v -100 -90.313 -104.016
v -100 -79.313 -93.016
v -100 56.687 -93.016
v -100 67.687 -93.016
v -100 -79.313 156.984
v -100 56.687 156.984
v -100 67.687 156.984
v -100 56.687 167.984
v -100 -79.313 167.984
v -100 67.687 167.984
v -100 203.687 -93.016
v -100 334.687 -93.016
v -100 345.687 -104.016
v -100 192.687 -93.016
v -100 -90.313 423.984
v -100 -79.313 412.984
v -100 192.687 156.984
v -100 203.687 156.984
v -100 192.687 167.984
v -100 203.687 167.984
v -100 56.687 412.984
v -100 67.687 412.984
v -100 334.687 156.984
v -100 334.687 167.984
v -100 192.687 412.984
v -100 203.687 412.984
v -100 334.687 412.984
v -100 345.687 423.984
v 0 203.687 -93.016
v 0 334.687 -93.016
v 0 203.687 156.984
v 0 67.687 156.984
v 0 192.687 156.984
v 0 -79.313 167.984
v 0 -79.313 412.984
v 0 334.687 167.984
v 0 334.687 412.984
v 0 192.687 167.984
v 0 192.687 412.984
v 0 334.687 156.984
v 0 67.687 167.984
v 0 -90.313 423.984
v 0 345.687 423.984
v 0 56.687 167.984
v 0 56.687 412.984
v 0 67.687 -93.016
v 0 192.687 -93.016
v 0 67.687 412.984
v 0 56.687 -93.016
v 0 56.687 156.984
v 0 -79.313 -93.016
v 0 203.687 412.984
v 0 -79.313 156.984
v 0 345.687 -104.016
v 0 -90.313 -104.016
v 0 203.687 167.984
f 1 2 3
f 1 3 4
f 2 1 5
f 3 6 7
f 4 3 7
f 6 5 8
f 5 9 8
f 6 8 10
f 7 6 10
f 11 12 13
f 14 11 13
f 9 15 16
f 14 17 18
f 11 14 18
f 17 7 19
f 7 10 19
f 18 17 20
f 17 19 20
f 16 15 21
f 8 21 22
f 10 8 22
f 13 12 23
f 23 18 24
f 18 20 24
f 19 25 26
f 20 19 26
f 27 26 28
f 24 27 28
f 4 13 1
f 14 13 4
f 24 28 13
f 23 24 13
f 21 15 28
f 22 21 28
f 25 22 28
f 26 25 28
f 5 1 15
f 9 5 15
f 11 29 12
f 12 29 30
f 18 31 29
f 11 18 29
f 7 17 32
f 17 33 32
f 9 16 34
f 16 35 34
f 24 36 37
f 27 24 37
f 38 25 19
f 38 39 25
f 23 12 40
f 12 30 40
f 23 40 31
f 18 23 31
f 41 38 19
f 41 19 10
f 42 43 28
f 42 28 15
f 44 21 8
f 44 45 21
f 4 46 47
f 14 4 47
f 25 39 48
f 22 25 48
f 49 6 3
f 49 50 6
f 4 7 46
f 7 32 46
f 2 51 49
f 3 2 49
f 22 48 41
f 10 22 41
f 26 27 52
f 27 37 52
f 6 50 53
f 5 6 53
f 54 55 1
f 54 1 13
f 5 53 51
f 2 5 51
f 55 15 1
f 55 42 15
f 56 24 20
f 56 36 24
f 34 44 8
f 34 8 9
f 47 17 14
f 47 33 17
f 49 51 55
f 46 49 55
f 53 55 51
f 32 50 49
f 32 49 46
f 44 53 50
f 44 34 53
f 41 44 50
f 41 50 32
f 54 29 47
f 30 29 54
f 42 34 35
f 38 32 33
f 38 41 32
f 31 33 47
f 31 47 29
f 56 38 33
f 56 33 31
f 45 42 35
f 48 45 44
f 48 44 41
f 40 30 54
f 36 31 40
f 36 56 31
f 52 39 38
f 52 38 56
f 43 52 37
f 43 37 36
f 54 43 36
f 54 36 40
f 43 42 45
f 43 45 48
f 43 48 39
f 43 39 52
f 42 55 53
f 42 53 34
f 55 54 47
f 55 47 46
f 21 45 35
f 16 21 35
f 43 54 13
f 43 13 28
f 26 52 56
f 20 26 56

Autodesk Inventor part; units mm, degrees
ref_plane "YZ Plane" through (0, 0, 0) normal (1, 0, 0) x (0, 1, 0)
ref_plane "XZ Plane" through (0, 0, 0) normal (0, 1, 0) x (-1, 0, 0)
ref_plane "XY Plane" through (0, 0, 0) normal (0, 0, 1) x (1, 0, 0)
sketch "Sketch1" plane through (0, 0, 0) normal (1, 0, 0) x (0, 1, 0)
  line L0 (345.6873, 423.9836) -> (-90.3127, 423.9836)
  line L1 (-90.3127, 423.9836) -> (-90.3127, -104.0164)
  line L2 (-90.3127, -104.0164) -> (345.6873, -104.0164)
  line L3 (345.6873, -104.0164) -> (345.6873, 423.9836)
  line L4 (334.6873, -93.0164) -> (334.6873, 156.9836)
  line L5 (334.6873, 167.9836) -> (334.6873, 412.9836)
  line L6 (203.6873, 412.9836) -> (203.6873, 167.9836)
  line L7 (203.6873, 156.9836) -> (203.6873, -93.0164)
  line L8 (192.6873, 412.9836) -> (192.6873, 167.9836)
  line L9 (192.6873, 156.9836) -> (192.6873, -93.0164)
  line L10 (334.6873, 156.9836) -> (203.6873, 156.9836)
  line L11 (334.6873, 167.9836) -> (203.6873, 167.9836)
  line L12 (334.6873, 412.9836) -> (203.6873, 412.9836)
  line L13 (192.6873, 412.9836) -> (67.6873, 412.9836)
  line L14 (56.6873, 412.9836) -> (-79.3127, 412.9836)
  line L15 (192.6873, 156.9836) -> (67.6873, 156.9836)
  line L16 (56.6873, 156.9836) -> (-79.3127, 156.9836)
  line L17 (192.6873, 167.9836) -> (67.6873, 167.9836)
  line L18 (56.6873, 167.9836) -> (-79.3127, 167.9836)
  line L19 (56.6873, 412.9836) -> (56.6873, 167.9836)
  line L20 (56.6873, 156.9836) -> (56.6873, -93.0164)
  line L21 (67.6873, 412.9836) -> (67.6873, 167.9836)
  line L22 (67.6873, 156.9836) -> (67.6873, -93.0164)
  line L23 (-79.3127, -93.0164) -> (56.6873, -93.0164)
  line L24 (67.6873, -93.0164) -> (192.6873, -93.0164)
  line L25 (203.6873, -93.0164) -> (334.6873, -93.0164)
  line L26 (-79.3127, 412.9836) -> (-79.3127, 167.9836)
  line L27 (-79.3127, 156.9836) -> (-79.3127, -93.0164)
extrude "Extrusion1" add sketch "Sketch1" against normal blind 100
properties part number "Estanteria" material "Wood (Cherry)"
